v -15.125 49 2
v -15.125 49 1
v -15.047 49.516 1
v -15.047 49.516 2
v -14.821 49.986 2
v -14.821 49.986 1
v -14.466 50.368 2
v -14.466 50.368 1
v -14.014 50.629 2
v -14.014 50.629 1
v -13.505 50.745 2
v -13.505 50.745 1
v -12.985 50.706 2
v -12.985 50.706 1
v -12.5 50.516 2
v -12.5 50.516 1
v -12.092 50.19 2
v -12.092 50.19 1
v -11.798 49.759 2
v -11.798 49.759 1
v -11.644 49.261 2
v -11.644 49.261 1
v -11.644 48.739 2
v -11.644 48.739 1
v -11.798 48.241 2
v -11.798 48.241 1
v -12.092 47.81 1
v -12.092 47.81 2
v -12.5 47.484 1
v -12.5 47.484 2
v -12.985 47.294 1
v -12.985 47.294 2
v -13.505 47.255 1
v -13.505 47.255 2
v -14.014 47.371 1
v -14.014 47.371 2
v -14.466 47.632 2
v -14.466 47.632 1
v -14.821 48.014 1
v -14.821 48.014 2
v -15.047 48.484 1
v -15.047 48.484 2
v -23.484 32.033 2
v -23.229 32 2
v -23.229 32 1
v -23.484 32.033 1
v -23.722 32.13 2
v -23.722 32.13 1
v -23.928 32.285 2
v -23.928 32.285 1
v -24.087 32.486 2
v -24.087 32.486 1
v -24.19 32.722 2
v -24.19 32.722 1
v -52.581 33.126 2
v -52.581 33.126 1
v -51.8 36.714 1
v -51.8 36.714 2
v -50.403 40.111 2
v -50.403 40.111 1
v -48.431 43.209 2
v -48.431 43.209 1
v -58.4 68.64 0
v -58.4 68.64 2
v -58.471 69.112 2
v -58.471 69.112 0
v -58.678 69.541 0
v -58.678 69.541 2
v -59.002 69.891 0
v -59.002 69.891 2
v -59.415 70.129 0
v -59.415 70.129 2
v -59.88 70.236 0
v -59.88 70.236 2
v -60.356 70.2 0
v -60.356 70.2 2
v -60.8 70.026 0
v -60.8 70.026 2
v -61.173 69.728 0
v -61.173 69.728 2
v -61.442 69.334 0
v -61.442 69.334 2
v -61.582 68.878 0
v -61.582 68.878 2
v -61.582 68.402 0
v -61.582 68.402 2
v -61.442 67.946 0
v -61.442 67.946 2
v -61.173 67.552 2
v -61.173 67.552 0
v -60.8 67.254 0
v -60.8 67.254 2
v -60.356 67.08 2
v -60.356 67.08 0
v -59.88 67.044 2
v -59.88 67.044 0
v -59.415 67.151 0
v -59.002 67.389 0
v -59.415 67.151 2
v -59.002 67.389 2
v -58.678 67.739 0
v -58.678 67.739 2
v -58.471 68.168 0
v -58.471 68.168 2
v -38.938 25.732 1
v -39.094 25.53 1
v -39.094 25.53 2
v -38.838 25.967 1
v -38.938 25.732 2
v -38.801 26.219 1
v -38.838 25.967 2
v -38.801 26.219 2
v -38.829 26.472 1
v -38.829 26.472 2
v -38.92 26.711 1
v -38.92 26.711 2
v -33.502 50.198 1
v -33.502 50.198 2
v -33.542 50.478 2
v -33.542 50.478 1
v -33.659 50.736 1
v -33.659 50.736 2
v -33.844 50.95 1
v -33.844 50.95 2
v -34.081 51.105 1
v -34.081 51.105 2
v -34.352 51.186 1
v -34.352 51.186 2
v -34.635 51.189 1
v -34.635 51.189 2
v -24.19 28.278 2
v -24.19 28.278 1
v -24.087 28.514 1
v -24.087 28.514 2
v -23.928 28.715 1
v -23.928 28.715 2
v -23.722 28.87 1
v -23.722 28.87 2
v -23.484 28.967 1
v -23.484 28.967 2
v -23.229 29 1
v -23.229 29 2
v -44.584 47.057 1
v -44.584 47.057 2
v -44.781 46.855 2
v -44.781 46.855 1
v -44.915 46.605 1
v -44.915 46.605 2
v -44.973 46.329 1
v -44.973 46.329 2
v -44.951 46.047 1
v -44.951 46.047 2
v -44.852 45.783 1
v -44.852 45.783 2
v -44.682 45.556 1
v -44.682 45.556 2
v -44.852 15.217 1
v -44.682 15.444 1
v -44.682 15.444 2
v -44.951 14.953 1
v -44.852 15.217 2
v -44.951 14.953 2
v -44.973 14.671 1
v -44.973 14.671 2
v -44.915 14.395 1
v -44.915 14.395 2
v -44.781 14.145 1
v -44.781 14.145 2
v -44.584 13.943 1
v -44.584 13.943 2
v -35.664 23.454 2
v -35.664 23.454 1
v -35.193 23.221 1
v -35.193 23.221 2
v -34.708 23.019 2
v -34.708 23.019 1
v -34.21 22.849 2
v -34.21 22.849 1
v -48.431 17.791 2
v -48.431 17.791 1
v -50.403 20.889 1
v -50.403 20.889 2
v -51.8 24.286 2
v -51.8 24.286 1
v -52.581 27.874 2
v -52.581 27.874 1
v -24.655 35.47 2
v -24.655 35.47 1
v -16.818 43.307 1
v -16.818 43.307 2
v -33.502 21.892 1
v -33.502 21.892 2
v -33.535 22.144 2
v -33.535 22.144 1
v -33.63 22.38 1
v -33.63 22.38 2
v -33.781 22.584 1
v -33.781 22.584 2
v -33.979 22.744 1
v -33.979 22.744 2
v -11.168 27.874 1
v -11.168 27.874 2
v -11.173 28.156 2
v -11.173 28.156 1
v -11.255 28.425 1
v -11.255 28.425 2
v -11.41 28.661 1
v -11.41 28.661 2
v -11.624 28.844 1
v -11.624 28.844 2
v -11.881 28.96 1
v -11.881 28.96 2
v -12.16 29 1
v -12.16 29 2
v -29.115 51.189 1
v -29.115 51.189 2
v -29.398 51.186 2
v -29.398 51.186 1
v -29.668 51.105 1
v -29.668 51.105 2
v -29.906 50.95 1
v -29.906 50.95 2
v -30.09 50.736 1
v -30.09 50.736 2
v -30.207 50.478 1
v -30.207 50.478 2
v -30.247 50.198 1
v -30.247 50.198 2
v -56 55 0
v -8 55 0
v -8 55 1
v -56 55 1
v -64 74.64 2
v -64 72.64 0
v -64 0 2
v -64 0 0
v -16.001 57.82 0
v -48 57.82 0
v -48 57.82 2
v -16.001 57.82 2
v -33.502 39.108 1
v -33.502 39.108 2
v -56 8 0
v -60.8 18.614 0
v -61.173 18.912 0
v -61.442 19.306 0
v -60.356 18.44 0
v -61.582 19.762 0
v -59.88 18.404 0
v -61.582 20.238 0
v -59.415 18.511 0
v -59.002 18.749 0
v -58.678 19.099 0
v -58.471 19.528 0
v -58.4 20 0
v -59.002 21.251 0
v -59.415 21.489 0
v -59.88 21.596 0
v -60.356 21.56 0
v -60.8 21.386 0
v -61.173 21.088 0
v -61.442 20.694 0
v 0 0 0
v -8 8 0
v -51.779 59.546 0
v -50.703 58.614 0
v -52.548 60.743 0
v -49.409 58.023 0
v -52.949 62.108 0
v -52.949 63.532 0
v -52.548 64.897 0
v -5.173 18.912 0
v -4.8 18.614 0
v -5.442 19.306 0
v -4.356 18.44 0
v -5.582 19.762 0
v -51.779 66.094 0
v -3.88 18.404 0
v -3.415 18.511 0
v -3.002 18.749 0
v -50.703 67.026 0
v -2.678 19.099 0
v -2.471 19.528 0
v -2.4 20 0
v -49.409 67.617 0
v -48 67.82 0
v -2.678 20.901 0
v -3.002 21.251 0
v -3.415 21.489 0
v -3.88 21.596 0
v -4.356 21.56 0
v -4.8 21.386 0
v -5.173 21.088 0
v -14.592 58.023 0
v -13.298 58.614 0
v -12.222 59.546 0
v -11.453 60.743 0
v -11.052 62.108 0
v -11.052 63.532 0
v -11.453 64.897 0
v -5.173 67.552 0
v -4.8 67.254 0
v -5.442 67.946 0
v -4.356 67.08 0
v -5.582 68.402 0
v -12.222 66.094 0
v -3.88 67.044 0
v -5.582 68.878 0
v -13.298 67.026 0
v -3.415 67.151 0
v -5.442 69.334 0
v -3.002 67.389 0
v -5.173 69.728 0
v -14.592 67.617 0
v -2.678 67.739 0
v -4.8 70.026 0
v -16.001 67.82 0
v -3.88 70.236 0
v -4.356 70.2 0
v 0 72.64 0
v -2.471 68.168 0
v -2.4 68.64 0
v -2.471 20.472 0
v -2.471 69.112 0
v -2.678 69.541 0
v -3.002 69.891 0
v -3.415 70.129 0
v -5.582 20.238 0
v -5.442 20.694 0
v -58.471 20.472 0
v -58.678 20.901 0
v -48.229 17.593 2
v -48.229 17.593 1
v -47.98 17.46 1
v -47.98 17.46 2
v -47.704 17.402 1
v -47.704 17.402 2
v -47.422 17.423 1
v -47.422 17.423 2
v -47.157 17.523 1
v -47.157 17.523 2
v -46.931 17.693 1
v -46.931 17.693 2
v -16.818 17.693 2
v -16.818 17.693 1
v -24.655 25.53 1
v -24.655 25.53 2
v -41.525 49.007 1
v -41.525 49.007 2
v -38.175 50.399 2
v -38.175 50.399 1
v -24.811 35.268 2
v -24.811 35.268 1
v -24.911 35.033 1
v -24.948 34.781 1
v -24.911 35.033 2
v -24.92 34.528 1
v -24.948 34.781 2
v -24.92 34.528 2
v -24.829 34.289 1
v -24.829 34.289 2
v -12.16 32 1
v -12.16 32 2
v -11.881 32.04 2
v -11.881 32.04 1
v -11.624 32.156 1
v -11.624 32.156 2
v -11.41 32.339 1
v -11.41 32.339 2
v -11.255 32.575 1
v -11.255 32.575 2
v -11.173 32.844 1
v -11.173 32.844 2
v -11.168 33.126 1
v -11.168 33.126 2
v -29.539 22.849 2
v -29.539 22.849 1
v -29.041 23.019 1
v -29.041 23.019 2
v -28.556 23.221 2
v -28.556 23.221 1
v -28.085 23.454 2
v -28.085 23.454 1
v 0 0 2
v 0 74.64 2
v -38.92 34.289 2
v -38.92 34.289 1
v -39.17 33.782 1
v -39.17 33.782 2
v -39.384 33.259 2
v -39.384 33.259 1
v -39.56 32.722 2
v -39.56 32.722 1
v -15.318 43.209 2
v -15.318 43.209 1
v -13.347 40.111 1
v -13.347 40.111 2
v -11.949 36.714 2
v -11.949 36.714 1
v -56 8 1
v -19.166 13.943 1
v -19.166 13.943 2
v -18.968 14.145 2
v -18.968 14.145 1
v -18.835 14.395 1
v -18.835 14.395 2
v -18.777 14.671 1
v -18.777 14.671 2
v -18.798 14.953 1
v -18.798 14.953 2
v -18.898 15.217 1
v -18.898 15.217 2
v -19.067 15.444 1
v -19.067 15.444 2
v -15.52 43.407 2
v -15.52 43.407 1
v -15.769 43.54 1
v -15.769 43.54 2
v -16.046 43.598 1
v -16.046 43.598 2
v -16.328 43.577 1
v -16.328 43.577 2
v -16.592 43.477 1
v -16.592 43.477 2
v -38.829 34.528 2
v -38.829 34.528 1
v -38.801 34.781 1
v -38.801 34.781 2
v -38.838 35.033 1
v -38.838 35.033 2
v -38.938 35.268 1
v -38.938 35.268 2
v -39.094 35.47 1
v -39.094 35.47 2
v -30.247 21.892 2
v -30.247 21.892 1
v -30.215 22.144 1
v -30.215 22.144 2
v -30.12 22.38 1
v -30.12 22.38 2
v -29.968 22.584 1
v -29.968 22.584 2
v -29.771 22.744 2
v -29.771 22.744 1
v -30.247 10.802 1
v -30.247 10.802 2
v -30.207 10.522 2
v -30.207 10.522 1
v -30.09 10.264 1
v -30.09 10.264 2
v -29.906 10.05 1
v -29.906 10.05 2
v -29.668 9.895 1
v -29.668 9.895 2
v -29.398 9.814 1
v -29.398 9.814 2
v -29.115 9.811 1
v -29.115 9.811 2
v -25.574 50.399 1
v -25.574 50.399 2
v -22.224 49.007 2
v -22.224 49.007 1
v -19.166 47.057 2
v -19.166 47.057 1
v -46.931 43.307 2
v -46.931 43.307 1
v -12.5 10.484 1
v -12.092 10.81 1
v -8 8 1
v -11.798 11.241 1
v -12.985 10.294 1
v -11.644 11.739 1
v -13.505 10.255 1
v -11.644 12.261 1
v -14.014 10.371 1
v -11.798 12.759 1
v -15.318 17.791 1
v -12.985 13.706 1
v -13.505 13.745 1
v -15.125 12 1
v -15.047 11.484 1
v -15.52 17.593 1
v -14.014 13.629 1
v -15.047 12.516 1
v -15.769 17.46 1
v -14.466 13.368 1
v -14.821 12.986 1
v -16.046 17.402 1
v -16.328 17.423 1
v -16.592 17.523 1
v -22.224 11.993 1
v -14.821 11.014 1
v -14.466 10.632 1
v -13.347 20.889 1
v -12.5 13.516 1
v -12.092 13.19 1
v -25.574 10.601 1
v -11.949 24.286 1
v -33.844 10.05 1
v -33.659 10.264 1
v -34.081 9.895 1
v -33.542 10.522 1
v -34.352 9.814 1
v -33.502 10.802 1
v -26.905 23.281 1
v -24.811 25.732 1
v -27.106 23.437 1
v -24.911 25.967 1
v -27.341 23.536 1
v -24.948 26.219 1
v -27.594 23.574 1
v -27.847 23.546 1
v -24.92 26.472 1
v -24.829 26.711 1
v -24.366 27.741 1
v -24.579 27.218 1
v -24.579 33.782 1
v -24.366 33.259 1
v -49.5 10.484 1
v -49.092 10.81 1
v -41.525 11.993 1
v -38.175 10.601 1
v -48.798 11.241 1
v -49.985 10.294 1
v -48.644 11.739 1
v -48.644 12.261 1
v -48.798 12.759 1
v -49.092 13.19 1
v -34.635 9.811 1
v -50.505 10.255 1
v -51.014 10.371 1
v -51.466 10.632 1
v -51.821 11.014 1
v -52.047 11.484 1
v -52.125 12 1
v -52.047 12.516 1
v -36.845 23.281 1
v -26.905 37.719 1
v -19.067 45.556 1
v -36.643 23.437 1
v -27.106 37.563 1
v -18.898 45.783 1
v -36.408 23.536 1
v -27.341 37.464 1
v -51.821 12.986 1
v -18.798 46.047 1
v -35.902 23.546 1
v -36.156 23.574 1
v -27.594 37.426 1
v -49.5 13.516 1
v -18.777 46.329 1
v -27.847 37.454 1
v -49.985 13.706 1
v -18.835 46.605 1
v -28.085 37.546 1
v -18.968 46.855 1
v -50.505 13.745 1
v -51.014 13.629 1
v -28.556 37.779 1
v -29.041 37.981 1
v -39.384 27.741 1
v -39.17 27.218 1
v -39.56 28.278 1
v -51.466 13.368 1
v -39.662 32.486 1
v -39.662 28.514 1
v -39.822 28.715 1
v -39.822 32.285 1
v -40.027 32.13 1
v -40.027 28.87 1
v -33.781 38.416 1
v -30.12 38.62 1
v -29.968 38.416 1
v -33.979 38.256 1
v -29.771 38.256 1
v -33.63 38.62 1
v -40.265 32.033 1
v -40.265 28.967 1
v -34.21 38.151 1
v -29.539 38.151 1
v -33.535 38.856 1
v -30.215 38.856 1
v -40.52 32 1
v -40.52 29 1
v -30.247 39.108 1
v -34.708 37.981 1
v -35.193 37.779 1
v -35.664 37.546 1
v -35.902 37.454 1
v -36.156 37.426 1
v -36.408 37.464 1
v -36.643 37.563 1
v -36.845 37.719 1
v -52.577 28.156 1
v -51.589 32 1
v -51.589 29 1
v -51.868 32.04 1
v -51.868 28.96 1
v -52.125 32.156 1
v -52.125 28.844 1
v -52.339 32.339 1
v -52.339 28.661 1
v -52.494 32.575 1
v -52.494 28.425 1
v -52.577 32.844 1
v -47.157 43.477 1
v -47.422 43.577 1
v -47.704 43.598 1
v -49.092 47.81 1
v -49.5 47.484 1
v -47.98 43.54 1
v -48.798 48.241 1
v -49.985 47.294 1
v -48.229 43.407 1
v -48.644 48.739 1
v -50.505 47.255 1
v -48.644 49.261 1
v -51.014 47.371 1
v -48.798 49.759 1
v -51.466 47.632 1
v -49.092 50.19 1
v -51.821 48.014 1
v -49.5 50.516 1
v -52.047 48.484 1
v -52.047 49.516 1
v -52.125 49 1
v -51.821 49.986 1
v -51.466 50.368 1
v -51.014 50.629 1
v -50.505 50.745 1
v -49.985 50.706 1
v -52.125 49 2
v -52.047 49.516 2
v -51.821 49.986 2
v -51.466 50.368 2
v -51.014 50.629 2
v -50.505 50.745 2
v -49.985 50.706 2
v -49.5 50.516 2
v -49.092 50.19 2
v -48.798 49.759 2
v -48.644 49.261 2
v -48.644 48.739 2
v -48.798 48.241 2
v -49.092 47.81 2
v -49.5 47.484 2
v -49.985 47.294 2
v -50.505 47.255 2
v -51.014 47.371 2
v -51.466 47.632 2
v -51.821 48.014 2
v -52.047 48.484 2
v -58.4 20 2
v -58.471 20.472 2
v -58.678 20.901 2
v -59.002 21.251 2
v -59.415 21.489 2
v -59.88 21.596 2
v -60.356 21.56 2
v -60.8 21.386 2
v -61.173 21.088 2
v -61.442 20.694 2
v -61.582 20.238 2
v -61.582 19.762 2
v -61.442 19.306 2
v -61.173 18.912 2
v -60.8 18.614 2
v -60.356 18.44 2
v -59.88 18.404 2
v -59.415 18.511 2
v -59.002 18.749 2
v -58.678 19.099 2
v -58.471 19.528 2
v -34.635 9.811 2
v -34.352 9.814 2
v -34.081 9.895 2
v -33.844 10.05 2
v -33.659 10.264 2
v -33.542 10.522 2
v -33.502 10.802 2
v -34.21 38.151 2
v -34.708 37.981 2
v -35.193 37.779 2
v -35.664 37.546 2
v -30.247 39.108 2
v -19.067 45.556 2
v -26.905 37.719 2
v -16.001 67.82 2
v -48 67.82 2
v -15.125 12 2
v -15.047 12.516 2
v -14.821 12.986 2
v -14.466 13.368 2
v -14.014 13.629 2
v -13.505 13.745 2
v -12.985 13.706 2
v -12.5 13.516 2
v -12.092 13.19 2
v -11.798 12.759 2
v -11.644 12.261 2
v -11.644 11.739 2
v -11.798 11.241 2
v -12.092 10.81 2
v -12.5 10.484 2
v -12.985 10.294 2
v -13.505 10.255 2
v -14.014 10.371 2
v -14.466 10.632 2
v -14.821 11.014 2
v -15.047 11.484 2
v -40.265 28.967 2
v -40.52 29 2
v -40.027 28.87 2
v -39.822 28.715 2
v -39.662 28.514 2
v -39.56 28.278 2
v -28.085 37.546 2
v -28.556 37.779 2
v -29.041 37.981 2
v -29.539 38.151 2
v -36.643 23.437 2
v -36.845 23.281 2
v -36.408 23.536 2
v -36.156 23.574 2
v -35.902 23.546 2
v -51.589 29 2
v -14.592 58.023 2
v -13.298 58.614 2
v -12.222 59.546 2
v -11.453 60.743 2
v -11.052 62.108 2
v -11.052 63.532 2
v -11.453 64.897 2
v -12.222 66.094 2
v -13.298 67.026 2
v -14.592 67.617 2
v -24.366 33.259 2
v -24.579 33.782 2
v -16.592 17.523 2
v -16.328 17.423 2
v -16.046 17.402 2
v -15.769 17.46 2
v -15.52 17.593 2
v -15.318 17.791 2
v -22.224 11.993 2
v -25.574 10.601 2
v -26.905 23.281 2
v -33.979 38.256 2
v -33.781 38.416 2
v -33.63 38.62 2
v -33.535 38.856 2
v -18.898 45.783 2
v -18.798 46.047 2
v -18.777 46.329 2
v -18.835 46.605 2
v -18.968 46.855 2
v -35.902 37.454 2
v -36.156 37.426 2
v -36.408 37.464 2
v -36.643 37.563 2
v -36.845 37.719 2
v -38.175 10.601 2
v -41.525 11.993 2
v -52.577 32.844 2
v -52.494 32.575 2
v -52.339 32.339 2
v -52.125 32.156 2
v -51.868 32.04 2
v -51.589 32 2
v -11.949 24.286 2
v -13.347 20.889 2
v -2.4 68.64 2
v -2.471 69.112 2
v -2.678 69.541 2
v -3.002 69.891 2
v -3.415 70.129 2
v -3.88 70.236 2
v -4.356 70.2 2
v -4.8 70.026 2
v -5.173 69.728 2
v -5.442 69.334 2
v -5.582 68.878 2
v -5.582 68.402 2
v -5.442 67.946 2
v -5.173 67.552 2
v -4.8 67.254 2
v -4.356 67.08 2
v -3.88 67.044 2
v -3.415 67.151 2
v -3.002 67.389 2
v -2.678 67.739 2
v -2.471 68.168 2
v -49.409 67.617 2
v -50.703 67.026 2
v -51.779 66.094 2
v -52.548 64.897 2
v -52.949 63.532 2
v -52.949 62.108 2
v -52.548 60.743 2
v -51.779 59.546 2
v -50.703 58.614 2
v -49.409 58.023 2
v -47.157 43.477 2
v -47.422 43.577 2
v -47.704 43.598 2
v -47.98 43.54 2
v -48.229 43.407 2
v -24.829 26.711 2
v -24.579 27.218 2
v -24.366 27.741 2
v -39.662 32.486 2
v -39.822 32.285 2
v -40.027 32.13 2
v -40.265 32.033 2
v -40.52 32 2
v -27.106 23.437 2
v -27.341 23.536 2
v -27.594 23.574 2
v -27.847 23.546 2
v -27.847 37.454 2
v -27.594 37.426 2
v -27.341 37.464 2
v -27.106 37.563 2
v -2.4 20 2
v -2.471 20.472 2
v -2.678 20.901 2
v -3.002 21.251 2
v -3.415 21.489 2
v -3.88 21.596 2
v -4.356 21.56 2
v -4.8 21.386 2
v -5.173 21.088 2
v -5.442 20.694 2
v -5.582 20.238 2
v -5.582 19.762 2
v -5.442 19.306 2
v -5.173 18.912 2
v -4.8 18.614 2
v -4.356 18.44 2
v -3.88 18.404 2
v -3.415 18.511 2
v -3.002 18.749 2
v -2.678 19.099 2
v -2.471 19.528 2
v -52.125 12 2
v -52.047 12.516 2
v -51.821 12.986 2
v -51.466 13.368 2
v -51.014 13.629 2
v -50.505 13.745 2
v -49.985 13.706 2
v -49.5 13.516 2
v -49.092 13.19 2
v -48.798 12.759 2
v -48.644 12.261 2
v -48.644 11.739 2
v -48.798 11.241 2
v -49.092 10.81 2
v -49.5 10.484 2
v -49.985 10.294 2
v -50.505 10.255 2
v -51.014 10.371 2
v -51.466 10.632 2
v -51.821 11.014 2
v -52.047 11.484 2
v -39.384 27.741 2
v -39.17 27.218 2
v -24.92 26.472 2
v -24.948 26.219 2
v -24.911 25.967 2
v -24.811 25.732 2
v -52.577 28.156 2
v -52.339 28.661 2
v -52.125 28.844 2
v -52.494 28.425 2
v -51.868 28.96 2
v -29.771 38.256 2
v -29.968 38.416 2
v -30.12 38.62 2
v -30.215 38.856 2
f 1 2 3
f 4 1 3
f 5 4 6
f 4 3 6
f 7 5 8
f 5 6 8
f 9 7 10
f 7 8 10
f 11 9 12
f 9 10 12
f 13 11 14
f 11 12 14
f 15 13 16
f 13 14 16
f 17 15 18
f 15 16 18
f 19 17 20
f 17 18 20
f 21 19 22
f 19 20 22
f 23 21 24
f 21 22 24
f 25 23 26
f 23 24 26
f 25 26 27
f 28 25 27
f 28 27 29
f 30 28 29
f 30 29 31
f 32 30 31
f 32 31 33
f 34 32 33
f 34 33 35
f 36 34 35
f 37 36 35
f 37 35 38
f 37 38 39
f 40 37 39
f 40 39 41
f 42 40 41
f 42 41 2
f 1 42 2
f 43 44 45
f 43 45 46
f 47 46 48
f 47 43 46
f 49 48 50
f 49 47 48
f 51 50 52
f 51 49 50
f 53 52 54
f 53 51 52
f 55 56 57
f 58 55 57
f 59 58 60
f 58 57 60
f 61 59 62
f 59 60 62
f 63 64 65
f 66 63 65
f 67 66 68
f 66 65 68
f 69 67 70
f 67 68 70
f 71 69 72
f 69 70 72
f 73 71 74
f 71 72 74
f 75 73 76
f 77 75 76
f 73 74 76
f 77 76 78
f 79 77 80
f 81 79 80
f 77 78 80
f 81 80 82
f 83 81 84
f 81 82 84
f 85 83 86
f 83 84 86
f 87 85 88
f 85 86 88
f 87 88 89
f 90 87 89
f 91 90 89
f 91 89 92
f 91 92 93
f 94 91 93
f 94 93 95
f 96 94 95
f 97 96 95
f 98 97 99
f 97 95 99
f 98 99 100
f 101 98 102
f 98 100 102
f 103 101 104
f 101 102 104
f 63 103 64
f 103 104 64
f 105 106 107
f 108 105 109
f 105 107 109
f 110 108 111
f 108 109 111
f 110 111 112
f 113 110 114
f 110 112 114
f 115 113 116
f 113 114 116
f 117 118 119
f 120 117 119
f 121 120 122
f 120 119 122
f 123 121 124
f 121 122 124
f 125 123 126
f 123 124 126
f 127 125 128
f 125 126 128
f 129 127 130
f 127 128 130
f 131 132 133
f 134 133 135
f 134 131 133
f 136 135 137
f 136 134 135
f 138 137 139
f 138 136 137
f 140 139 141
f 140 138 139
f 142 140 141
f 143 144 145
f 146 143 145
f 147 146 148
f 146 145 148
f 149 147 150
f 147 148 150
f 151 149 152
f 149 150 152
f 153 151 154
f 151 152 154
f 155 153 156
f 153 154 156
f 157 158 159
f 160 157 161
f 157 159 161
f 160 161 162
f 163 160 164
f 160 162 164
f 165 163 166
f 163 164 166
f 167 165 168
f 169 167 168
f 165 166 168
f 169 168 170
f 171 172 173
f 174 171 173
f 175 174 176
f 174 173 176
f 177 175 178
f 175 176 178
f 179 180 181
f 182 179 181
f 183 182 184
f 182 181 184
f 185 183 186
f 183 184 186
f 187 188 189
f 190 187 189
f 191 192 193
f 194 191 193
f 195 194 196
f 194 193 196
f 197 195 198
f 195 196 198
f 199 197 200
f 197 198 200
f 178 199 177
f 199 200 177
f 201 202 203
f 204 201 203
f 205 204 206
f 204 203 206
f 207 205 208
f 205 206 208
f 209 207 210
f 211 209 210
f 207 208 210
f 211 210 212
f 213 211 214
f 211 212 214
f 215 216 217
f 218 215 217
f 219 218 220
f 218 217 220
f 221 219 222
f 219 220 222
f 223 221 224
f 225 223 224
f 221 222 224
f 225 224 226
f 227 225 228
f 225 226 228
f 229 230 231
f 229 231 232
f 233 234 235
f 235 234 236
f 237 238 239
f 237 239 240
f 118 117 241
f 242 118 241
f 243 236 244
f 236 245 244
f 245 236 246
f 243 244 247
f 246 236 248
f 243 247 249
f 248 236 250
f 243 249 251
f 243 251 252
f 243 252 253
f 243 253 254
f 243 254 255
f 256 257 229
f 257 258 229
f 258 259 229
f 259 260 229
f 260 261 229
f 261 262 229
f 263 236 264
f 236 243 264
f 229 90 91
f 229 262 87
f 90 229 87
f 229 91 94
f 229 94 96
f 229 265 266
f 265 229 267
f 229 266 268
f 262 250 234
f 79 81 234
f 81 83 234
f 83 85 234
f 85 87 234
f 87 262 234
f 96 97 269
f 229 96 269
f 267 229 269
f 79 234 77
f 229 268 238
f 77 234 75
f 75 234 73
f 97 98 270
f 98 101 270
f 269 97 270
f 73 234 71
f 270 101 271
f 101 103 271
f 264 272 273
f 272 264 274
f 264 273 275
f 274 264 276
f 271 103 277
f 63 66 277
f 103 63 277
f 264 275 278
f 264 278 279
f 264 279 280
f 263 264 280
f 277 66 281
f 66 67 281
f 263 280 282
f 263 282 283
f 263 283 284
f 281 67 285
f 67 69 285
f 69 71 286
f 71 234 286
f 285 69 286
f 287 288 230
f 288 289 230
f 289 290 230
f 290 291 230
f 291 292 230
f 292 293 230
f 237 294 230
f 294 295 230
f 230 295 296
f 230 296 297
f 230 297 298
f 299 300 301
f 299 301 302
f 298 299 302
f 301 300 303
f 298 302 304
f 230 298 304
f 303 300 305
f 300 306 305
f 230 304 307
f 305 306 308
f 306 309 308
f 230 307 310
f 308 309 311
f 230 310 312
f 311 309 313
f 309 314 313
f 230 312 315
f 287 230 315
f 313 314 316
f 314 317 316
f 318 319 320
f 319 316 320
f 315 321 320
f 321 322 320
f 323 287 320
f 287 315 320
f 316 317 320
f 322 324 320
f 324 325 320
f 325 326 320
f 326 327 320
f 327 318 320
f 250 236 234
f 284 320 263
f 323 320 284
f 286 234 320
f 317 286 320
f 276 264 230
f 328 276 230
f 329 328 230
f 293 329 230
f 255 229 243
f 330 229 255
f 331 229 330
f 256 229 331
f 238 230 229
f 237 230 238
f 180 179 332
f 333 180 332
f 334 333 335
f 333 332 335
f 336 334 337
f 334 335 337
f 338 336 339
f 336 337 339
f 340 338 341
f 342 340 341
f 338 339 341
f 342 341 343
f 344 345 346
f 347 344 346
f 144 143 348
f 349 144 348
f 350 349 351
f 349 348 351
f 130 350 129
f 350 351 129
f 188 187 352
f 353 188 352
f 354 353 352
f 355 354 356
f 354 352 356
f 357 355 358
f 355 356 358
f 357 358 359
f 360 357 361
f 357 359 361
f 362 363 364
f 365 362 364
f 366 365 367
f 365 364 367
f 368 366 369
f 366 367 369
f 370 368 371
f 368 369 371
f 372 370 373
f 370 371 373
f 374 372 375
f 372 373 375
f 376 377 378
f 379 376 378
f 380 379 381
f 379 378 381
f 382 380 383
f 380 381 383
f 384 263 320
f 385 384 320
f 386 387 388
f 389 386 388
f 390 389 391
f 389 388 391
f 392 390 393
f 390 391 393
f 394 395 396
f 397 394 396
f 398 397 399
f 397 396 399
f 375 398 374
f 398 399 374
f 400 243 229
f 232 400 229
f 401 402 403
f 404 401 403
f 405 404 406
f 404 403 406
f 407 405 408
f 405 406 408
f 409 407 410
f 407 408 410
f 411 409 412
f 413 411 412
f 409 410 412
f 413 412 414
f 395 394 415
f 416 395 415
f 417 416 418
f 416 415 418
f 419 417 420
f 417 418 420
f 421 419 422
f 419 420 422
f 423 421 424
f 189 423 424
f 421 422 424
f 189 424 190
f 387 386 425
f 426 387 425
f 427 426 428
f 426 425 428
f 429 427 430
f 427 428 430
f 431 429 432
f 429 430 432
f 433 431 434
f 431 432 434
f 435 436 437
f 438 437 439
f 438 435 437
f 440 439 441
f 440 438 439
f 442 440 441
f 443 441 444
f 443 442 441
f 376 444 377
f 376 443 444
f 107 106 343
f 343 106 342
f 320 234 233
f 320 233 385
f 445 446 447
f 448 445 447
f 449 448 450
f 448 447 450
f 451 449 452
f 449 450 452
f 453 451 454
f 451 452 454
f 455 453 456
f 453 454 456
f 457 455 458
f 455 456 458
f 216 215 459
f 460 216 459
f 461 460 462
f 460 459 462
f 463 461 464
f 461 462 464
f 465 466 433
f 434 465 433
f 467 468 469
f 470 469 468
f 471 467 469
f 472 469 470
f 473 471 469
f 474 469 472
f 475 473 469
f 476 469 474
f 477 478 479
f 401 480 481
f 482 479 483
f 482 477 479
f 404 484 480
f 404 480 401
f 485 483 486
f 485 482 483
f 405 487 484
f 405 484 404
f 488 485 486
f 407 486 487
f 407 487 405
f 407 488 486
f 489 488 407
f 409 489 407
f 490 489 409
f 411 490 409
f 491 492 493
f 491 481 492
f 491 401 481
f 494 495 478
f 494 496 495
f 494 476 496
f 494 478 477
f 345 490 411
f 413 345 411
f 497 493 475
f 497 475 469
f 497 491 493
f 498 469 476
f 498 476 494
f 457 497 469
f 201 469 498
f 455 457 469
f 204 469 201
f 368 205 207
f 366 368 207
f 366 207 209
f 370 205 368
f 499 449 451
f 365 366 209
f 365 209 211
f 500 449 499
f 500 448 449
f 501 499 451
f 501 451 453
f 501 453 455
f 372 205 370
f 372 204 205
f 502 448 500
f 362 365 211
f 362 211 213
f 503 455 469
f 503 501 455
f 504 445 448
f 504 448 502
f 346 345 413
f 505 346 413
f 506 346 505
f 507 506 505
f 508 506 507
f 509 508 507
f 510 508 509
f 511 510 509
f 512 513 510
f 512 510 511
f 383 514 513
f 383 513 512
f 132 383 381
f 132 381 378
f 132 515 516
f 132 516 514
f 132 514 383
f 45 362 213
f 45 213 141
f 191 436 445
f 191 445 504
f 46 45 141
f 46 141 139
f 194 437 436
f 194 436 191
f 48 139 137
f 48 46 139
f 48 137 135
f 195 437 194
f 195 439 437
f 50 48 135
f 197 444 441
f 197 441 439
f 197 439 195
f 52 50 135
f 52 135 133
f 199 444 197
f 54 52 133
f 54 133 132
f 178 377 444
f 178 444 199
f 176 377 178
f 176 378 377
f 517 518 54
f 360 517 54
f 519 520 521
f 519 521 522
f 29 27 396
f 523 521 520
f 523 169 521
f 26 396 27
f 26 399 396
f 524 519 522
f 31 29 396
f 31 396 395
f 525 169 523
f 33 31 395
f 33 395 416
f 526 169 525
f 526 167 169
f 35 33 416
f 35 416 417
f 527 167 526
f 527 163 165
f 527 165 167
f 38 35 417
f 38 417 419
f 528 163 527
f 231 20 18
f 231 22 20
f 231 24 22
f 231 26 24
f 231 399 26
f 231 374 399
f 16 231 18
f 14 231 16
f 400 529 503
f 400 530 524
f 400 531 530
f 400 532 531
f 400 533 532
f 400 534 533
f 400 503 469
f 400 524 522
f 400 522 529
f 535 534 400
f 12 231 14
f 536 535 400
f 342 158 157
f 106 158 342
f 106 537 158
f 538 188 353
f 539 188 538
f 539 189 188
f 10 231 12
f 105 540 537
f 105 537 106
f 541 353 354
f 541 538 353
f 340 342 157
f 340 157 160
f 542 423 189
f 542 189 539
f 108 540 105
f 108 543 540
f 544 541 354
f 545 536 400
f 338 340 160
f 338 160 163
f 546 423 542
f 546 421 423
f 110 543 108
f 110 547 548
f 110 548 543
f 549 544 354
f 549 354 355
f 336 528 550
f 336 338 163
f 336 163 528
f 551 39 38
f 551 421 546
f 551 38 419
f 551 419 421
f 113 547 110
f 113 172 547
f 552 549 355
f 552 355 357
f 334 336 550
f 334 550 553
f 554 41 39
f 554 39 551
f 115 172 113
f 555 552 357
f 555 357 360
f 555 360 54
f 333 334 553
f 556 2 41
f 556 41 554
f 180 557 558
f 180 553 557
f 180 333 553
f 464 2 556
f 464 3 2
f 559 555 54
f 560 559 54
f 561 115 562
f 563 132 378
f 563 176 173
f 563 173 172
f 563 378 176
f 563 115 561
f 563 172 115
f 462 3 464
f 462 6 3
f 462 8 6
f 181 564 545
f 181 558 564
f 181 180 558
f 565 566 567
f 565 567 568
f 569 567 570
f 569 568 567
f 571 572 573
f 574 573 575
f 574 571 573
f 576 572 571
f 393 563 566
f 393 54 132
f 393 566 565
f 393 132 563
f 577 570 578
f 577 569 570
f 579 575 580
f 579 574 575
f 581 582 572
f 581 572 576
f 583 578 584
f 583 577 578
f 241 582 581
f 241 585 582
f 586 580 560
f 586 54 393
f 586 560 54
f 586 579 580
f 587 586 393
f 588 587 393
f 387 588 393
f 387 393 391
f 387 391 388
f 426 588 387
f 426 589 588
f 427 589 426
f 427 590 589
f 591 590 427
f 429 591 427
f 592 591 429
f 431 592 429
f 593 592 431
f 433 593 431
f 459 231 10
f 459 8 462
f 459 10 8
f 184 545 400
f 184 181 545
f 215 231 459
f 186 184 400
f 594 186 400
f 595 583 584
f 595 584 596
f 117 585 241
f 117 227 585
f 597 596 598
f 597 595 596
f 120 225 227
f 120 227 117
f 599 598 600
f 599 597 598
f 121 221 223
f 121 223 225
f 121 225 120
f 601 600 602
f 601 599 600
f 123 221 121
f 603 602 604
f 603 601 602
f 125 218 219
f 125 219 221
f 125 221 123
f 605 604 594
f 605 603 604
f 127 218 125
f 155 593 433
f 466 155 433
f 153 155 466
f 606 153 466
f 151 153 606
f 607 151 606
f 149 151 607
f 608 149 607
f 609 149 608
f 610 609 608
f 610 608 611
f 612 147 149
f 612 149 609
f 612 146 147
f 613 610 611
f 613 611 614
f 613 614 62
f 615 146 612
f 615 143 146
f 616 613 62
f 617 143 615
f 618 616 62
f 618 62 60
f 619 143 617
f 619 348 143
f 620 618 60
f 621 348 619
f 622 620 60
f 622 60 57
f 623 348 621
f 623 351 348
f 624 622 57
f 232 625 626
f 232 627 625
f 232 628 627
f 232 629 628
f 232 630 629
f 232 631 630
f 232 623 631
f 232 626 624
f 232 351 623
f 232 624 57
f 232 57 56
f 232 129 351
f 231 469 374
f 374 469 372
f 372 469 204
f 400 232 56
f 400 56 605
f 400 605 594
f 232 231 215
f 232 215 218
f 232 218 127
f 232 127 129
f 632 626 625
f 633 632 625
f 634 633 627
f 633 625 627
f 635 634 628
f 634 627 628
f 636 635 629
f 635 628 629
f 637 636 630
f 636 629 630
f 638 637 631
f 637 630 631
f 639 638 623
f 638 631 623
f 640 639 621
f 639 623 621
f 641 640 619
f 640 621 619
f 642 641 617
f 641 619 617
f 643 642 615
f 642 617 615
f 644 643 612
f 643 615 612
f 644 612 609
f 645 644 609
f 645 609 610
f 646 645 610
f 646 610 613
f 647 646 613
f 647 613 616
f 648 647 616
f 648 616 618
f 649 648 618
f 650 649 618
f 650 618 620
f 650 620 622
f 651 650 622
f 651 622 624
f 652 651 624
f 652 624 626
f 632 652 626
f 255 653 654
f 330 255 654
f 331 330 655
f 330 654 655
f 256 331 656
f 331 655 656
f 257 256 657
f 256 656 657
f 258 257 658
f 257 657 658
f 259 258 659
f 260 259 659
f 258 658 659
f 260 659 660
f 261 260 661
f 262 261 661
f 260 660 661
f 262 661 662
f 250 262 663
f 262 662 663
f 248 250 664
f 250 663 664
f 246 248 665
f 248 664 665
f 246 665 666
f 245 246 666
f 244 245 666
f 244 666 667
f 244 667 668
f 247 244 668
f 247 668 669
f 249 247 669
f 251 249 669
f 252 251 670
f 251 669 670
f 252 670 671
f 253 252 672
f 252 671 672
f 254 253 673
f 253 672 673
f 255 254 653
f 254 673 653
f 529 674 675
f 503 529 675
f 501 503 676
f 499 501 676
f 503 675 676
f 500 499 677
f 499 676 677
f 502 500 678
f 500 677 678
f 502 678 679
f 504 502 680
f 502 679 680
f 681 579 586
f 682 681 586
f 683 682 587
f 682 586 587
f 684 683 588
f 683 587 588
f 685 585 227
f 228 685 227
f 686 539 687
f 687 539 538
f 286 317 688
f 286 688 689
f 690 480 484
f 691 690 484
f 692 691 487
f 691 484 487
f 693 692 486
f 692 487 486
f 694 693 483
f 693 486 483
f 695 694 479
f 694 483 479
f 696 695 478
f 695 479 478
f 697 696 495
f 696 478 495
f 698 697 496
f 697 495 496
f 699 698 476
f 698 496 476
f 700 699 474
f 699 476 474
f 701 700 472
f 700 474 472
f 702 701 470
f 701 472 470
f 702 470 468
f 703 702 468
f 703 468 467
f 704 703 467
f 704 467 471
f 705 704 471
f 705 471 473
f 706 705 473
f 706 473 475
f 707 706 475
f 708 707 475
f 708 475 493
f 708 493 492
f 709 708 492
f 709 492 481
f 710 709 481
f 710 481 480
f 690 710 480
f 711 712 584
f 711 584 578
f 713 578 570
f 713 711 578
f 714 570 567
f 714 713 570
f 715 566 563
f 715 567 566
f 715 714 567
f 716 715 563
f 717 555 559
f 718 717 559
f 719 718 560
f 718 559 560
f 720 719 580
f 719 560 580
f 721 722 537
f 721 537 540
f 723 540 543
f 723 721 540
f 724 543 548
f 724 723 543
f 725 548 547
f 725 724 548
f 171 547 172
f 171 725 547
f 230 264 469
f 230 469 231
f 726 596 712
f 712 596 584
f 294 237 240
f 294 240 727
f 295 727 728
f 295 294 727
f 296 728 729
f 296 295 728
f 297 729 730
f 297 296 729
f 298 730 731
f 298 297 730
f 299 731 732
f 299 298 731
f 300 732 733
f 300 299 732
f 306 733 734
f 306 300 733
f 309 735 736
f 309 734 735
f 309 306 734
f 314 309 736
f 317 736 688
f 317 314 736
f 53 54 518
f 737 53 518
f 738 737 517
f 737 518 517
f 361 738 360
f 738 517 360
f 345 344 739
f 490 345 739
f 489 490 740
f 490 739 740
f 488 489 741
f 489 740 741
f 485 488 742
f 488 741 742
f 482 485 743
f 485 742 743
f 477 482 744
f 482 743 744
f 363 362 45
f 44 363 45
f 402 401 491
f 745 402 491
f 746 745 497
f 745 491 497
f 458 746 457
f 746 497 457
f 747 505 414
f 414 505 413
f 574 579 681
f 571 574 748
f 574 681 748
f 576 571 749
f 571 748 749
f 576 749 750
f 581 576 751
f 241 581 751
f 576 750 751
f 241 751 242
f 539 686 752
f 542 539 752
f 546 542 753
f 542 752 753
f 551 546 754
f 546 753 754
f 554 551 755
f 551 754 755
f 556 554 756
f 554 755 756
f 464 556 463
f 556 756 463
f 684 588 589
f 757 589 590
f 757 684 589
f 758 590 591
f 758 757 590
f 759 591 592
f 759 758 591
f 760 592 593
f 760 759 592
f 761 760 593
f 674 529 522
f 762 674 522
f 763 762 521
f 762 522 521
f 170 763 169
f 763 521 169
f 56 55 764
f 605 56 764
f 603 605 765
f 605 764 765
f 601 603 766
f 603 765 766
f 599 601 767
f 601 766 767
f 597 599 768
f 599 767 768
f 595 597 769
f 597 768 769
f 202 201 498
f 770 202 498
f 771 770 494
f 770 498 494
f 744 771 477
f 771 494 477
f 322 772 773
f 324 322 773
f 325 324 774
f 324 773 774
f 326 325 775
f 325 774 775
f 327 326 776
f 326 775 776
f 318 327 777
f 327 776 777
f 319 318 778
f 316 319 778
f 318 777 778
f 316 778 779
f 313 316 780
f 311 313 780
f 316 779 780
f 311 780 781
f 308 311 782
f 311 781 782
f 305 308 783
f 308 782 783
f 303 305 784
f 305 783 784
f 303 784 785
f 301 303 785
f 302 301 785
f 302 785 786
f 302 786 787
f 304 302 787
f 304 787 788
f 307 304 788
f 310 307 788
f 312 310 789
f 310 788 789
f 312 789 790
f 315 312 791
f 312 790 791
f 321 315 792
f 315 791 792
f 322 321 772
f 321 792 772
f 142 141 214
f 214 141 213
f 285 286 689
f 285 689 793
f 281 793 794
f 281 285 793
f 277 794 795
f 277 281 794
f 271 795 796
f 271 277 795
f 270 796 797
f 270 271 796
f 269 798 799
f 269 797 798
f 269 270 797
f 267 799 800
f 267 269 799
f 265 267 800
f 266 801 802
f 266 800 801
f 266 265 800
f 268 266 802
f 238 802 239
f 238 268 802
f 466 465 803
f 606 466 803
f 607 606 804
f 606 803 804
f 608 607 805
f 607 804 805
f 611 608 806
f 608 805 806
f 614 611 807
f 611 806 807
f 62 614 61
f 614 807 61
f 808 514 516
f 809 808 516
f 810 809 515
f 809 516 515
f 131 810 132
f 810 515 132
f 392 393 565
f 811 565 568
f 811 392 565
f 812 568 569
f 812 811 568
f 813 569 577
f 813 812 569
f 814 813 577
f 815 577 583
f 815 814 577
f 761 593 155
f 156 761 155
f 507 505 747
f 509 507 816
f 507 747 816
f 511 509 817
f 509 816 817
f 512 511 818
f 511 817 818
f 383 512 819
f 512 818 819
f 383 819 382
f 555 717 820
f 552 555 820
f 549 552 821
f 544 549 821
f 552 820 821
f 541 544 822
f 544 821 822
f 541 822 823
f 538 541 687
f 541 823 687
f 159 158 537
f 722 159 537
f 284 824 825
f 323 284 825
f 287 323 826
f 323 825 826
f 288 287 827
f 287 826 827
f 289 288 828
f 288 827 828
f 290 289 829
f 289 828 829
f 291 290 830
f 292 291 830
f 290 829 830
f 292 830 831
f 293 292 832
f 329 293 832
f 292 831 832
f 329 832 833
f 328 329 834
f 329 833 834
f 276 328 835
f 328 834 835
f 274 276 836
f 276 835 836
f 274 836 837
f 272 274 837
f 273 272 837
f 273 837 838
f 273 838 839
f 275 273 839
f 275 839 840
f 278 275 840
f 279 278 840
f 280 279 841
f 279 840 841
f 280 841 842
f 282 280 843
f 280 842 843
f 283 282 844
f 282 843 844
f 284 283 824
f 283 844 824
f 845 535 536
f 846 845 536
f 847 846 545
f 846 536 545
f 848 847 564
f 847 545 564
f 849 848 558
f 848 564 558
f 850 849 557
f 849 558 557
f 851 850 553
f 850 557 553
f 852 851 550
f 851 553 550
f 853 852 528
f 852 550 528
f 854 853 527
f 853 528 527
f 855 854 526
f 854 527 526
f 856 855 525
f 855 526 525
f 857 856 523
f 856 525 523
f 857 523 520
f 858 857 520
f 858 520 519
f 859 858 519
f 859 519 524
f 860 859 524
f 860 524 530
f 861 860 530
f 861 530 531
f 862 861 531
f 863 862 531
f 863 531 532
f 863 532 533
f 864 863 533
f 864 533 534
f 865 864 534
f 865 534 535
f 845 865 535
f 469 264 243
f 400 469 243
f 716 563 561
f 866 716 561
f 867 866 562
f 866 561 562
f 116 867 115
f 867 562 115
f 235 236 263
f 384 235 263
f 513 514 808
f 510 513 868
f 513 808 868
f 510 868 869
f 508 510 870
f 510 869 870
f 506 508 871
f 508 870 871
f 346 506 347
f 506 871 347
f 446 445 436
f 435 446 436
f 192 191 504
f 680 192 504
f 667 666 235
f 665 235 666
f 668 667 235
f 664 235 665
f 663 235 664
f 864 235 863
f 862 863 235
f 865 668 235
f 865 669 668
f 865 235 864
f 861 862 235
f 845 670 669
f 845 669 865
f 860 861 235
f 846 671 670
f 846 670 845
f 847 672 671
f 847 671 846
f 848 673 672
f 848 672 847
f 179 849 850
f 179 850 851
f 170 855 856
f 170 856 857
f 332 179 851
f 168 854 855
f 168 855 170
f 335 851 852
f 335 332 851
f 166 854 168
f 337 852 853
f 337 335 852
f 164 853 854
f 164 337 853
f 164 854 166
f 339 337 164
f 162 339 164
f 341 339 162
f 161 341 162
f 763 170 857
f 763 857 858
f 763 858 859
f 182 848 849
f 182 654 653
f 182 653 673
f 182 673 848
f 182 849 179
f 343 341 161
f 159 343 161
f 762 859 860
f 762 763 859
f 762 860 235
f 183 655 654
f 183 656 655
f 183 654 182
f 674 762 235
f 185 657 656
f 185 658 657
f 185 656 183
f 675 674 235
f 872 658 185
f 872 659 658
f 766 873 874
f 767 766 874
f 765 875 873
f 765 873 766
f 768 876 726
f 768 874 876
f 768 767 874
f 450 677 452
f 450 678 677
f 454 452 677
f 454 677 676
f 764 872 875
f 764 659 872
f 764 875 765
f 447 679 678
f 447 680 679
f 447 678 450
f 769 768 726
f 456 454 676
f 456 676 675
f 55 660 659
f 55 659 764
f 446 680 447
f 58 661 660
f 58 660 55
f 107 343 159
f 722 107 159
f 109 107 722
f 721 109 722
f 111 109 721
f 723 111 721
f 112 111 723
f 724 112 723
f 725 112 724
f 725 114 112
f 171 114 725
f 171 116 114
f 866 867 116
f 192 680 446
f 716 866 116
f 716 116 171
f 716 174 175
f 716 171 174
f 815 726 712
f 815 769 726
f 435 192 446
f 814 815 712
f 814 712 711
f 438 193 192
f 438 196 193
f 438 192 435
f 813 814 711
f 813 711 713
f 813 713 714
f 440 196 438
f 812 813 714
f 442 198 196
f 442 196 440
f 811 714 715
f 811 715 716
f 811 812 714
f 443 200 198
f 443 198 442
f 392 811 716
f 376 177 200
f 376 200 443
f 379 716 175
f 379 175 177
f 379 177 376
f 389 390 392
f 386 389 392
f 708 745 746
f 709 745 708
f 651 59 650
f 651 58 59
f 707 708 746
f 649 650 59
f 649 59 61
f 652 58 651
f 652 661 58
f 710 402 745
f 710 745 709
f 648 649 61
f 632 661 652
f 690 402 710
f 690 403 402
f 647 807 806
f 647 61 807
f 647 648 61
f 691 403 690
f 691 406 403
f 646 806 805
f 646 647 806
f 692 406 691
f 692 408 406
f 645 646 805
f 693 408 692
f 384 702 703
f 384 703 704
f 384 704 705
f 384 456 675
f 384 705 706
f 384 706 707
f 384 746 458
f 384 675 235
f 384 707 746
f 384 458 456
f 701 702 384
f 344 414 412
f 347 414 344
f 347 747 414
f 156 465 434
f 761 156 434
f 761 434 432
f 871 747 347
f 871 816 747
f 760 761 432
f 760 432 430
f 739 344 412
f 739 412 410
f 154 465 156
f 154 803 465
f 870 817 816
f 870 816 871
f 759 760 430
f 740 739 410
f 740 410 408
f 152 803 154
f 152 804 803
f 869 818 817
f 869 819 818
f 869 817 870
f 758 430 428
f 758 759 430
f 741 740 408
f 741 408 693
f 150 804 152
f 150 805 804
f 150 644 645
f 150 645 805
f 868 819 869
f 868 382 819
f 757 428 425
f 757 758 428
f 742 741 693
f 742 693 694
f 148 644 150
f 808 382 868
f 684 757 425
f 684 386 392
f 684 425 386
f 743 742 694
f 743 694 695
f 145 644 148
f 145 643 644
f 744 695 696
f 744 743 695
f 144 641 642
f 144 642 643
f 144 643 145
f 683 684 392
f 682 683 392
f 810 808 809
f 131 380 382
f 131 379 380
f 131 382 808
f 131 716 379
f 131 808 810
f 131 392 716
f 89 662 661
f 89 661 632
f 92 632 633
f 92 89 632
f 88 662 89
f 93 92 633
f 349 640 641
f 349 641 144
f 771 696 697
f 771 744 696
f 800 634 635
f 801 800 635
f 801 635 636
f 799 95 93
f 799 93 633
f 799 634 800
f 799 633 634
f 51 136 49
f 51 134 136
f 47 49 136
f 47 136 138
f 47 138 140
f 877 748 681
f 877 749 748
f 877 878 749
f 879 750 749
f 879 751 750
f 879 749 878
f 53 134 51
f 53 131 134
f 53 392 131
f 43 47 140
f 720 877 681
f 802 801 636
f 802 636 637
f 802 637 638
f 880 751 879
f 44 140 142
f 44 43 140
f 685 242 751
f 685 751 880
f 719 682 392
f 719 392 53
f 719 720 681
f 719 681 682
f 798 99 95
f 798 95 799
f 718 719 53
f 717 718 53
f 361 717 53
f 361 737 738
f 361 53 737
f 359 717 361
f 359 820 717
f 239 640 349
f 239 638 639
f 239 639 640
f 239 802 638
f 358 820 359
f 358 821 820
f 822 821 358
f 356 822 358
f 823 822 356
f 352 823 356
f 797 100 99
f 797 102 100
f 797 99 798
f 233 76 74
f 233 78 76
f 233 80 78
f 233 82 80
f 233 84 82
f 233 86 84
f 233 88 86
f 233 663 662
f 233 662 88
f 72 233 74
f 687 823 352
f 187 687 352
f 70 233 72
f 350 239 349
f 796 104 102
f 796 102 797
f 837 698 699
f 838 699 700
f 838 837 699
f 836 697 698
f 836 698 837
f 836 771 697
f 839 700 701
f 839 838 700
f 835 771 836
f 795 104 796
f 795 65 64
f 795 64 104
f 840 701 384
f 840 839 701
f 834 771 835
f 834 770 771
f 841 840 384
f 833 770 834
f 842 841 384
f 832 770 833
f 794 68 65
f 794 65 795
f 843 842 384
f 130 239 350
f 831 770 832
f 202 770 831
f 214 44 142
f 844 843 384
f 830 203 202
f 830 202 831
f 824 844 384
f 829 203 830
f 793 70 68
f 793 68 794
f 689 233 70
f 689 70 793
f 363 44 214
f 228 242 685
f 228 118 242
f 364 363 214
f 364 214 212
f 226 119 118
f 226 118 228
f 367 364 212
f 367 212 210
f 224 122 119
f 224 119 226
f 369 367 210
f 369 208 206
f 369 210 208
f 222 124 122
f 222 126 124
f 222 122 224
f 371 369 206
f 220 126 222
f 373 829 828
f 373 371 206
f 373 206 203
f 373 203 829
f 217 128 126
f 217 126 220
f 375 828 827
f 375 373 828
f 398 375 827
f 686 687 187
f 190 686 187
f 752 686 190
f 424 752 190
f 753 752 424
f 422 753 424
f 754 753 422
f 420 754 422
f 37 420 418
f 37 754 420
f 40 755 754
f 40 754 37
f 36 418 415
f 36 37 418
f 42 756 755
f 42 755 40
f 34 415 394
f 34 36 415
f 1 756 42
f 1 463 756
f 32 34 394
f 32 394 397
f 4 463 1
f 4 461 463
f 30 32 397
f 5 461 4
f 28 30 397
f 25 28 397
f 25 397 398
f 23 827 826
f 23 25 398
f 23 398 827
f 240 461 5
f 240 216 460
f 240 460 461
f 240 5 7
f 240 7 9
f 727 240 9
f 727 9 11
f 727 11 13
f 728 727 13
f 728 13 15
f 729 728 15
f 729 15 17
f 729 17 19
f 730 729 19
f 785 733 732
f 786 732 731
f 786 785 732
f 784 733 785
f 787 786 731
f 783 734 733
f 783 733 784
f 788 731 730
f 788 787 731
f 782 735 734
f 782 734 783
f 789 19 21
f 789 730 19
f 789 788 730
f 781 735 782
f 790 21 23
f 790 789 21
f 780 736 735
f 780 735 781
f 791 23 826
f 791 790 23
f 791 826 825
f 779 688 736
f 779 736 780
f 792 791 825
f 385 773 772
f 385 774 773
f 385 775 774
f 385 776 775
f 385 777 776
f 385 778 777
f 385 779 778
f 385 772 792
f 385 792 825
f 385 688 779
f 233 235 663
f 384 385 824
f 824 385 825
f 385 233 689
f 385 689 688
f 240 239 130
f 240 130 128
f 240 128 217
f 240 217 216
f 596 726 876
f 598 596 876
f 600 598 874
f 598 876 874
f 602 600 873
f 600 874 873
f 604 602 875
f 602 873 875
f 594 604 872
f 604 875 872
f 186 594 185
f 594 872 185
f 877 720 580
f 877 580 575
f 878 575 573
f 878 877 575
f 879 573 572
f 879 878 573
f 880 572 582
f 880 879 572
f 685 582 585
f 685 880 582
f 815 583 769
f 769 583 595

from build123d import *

# Parameters (mm, degrees)
SZKIC1_W                    = 64
SZKIC1_H                    = 2
SZKIC1_H_2                  = 72.64
DODANIE_WYCI_GNI_CIE1_DEPTH = 2
SFAZOWANIE1_SIZE            = 2
SZKIC2_R                    = 1.6
WYTNIJ_WYCI_GNI_CIE1_DEPTH  = 2
WYTNIJ_WYCI_GNI_CIE2_DEPTH  = 10
ZAOKR_GLENIE1_R             = 1
SZKIC4_R                    = 1.75
WYTNIJ_WYCI_GNI_CIE3_DEPTH  = 10
WYTNIJ_WYCI_GNI_CIE4_DEPTH  = 10
SZKIC6_W                    = 48
SZKIC6_H                    = 47
WYTNIJ_WYCI_GNI_CIE5_DEPTH  = 1


with BuildPart() as part:
    # Szkic1 → Dodanie-wyciągnięcie1 (new body)
    with BuildSketch(Plane.XY):
        with Locations((-32, 73.64)):
            Rectangle(SZKIC1_W, SZKIC1_H)
        with Locations((-32, 36.32)):
            Rectangle(SZKIC1_W, SZKIC1_H_2)
    extrude(amount=DODANIE_WYCI_GNI_CIE1_DEPTH)

    # Sfazowanie1
    sfazowanie1_edges = [part.edges().sort_by_distance(p)[0] for p in [
        (-32, 74.64, 0),
    ]]
    chamfer(sfazowanie1_edges, length=SFAZOWANIE1_SIZE - 0.0001)  # a hair under: the kernel refuses the full size

    # Szkic2 → Wytnij-wyciągnięcie1 (cut)
    with BuildSketch(Plane.XY.offset(2)):
        with Locations((-60, 20)):
            Circle(SZKIC2_R)
        with Locations((-4, 20)):
            Circle(SZKIC2_R)
        with Locations((-4, 68.64)):
            Circle(SZKIC2_R)
        with Locations((-60, 68.64)):
            Circle(SZKIC2_R)
    extrude(amount=-WYTNIJ_WYCI_GNI_CIE1_DEPTH, mode=Mode.SUBTRACT)

    # Szkic3 → Wytnij-wyciągnięcie2 (cut)
    with BuildSketch(Plane(origin=(0, 0, 0), x_dir=(-1, 0, 0), z_dir=(0, 0, -1))):
        with BuildLine():
            Line((11.056403618, 32), (24.016552746, 32))
            ThreePointArc((24.016552746, 32), (24.466137465, 33.518882587), (25.206174928, 34.919409376))
            Line((25.206174928, 34.919409376), (16.034132153, 44.091452151))
            ThreePointArc((16.034132153, 44.091452151), (12.573950156, 38.445591693), (11.056403618, 32))
        make_face()
        with BuildLine():
            ThreePointArc((25.206174928, 26.080590624), (24.466137465, 27.481117413), (24.016552746, 29))
            Line((24.016552746, 29), (11.056403618, 29))
            ThreePointArc((11.056403618, 29), (12.573950156, 22.554408307), (16.034132153, 16.908547849))
            Line((16.034132153, 16.908547849), (25.206174928, 26.080590624))
        make_face()
        with BuildLine():
            ThreePointArc((27.455260193, 37.168494641), (28.795563732, 37.883705523), (30.246904647, 38.332648426))
            Line((30.246904647, 38.332648426), (30.246904647, 51.308665948))
            ThreePointArc((30.246904647, 51.308665948), (23.86987617, 49.77624133), (18.283217418, 46.340537416))
            Line((18.283217418, 46.340537416), (27.455260193, 37.168494641))
        make_face()
        with BuildLine():
            ThreePointArc((33.50243449, 38.332648426), (34.953775405, 37.883705523), (36.294078944, 37.168494641))
            Line((36.294078944, 37.168494641), (45.466121719, 46.340537416))
            ThreePointArc((45.466121719, 46.340537416), (39.879462967, 49.77624133), (33.50243449, 51.308665948))
            Line((33.50243449, 51.308665948), (33.50243449, 38.332648426))
        make_face()
        with BuildLine():
            ThreePointArc((38.543164209, 34.919409376), (39.283201672, 33.518882587), (39.732786391, 32))
            Line((39.732786391, 32), (52.692935519, 32))
            ThreePointArc((52.692935519, 32), (51.175388981, 38.445591693), (47.715206984, 44.091452151))
            Line((47.715206984, 44.091452151), (38.543164209, 34.919409376))
        make_face()
        with BuildLine():
            Line((52.692935519, 29), (39.732786391, 29))
            ThreePointArc((39.732786391, 29), (39.283201672, 27.481117413), (38.543164209, 26.080590624))
            Line((38.543164209, 26.080590624), (47.715206984, 16.908547849))
            ThreePointArc((47.715206984, 16.908547849), (51.175388981, 22.554408307), (52.692935519, 29))
        make_face()
        with BuildLine():
            Line((45.466121719, 14.659462584), (36.294078944, 23.831505359))
            ThreePointArc((36.294078944, 23.831505359), (34.953775405, 23.116294477), (33.50243449, 22.667351574))
            Line((33.50243449, 22.667351574), (33.50243449, 9.691334052))
            ThreePointArc((33.50243449, 9.691334052), (39.879462967, 11.22375867), (45.466121719, 14.659462584))
        make_face()
        with BuildLine():
            Line((30.246904647, 9.691334052), (30.246904647, 22.667351574))
            ThreePointArc((30.246904647, 22.667351574), (28.795563732, 23.116294477), (27.455260193, 23.831505359))
            Line((27.455260193, 23.831505359), (18.283217418, 14.659462584))
            ThreePointArc((18.283217418, 14.659462584), (23.86987617, 11.22375867), (30.246904647, 9.691334052))
        make_face()
    extrude(amount=-WYTNIJ_WYCI_GNI_CIE2_DEPTH, mode=Mode.SUBTRACT)

    # Zaokrąglenie1
    zaokr_glenie1_edges = [part.edges().sort_by_distance(p)[0] for p in [
        (-36.294078944, 37.168494641, 1),
        (-33.50243449, 38.332648426, 1),
        (-33.50243449, 51.308665948, 1),
        (-45.466121719, 46.340537416, 1),
        (-33.50243449, 22.667351574, 1),
        (-36.294078944, 23.831505359, 1),
        (-45.466121719, 14.659462584, 1),
        (-33.50243449, 9.691334052, 1),
        (-38.543164209, 26.080590624, 1),
        (-39.732786391, 29, 1),
        (-52.692935519, 29, 1),
        (-47.715206984, 16.908547849, 1),
        (-27.455260193, 23.831505359, 1),
        (-30.246904647, 22.667351574, 1),
        (-30.246904647, 9.691334052, 1),
        (-18.283217418, 14.659462584, 1),
        (-25.206174928, 34.919409376, 1),
        (-24.016552746, 32, 1),
        (-11.056403618, 32, 1),
        (-16.034132153, 44.091452151, 1),
        (-24.016552746, 29, 1),
        (-25.206174928, 26.080590624, 1),
        (-16.034132153, 16.908547849, 1),
        (-11.056403618, 29, 1),
        (-30.246904647, 38.332648426, 1),
        (-27.455260193, 37.168494641, 1),
        (-18.283217418, 46.340537416, 1),
        (-30.246904647, 51.308665948, 1),
        (-39.732786391, 32, 1),
        (-38.543164209, 34.919409376, 1),
        (-47.715206984, 44.091452151, 1),
        (-52.692935519, 32, 1),
    ]]
    fillet(zaokr_glenie1_edges, radius=ZAOKR_GLENIE1_R)

    # Szkic4 → Wytnij-wyciągnięcie3 (cut)
    with BuildSketch(Plane(origin=(0, 0, 0), x_dir=(-1, 0, 0), z_dir=(0, 0, -1))):
        with Locations((13.374669569, 49)):
            Circle(SZKIC4_R)
        with Locations((50.374669569, 49)):
            Circle(SZKIC4_R)
        with Locations((50.374669569, 12)):
            Circle(SZKIC4_R)
        with Locations((13.374669569, 12)):
            Circle(SZKIC4_R)
    extrude(amount=-WYTNIJ_WYCI_GNI_CIE3_DEPTH, mode=Mode.SUBTRACT)

    # Szkic5 → Wytnij-wyciągnięcie4 (cut)
    with BuildSketch(Plane(origin=(0, 0, 0), x_dir=(-1, 0, 0), z_dir=(0, 0, -1))):
        with BuildLine():
            Line((16.000918864, 67.82), (48, 67.82))
            ThreePointArc((48, 67.82), (53, 62.82), (48, 57.82))
            Line((48, 57.82), (16.000918864, 57.82))
            ThreePointArc((16.000918864, 57.82), (11.000918864, 62.82), (16.000918864, 67.82))
        make_face()
    extrude(amount=-WYTNIJ_WYCI_GNI_CIE4_DEPTH, mode=Mode.SUBTRACT)

    # Szkic6 → Wytnij-wyciągnięcie5 (cut)
    with BuildSketch(Plane(origin=(0, 0, 0), x_dir=(-1, 0, 0), z_dir=(0, 0, -1))):
        with Locations((32, 31.5)):
            Rectangle(SZKIC6_W, SZKIC6_H)
    extrude(amount=-WYTNIJ_WYCI_GNI_CIE5_DEPTH, mode=Mode.SUBTRACT)


solid = part.part
